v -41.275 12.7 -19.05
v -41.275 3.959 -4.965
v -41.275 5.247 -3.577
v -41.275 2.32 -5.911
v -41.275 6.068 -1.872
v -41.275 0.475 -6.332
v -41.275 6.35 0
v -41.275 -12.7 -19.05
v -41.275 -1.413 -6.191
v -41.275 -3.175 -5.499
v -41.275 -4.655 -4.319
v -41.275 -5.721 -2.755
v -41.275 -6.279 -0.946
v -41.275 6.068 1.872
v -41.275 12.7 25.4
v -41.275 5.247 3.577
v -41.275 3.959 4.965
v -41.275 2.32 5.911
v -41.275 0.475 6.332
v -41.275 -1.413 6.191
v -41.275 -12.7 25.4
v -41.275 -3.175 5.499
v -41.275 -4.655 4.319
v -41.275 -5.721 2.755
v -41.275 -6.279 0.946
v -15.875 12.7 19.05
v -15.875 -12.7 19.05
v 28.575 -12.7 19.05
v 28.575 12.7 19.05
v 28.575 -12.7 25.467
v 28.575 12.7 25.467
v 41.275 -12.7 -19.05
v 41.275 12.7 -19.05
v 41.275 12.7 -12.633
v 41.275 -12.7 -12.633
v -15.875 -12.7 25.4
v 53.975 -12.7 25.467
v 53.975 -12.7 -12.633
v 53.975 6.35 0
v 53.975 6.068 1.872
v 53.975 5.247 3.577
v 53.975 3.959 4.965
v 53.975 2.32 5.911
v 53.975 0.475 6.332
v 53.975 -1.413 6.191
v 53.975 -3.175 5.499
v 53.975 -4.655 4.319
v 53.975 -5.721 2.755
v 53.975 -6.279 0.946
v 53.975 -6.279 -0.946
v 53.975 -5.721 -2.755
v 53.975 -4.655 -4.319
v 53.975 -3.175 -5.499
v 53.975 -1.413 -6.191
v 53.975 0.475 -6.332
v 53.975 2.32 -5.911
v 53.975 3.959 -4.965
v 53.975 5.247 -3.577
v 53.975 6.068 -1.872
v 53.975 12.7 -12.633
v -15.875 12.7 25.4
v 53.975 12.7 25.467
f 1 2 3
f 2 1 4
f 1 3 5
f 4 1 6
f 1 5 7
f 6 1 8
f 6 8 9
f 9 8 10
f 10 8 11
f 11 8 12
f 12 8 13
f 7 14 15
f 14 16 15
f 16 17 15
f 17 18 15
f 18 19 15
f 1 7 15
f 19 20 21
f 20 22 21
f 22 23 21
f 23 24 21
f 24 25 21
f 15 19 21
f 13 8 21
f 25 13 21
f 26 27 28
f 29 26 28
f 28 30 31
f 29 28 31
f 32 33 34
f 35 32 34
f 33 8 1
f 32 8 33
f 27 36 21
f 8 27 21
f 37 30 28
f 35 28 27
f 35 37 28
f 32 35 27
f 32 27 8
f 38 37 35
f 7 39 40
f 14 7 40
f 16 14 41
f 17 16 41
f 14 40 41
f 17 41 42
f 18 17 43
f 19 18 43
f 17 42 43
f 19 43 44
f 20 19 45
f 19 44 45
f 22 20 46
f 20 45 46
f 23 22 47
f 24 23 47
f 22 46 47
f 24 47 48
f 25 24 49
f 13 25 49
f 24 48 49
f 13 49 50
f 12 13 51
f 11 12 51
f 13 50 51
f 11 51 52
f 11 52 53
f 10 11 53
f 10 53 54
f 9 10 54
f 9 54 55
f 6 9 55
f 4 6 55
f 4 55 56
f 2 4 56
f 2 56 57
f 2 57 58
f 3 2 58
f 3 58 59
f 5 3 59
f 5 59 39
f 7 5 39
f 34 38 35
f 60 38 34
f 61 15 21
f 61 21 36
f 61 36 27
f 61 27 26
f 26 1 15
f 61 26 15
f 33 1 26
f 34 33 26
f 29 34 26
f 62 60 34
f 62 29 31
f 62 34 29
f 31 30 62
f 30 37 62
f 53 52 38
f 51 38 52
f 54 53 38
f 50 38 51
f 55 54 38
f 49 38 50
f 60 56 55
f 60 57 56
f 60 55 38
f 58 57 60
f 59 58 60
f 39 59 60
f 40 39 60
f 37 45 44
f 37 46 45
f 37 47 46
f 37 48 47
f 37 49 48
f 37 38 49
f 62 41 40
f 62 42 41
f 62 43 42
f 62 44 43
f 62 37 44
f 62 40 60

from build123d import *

# Parameters (mm, degrees)
F0_W     = 82.55
F0_H     = 38.1
F2_DEPTH = 12.7
F3_W     = 25.4
F3_H     = 25.4
F4_DEPTH = 6.35
F5_W     = 25.4
F5_H     = 6.416842
F5_H_2   = 31.683158
F6_DEPTH = 12.7
F7_R     = 6.35
F8_DEPTH = 95.251


with BuildPart() as f2:
    # F0 (on Front) → F2 (new body, symmetric)
    with BuildSketch(Plane.XZ):
        Rectangle(F0_W, F0_H)
    extrude(amount=F2_DEPTH, both=True)

    # F3 (on face) → F4 (join, symmetric)
    with BuildSketch(Plane.XY.offset(19.05)):
        with Locations((-28.575, 0)):
            Rectangle(F3_W, F3_H)
    extrude(amount=F4_DEPTH, both=True)

    # F5 (on face) → F6 (join, symmetric)
    with BuildSketch(Plane.YZ.offset(41.275)):
        with Locations((0, 22.258421)):
            Rectangle(F5_W, F5_H)
        with Locations((0, 3.208421)):
            Rectangle(F5_W, F5_H_2)
    extrude(amount=F6_DEPTH, both=True)

    # F7 (on face) → F8 (cut, through all)
    with BuildSketch(Plane.YZ.offset(53.975)):
        Circle(F7_R)
    extrude(amount=-F8_DEPTH, mode=Mode.SUBTRACT)


solid = f2.part
